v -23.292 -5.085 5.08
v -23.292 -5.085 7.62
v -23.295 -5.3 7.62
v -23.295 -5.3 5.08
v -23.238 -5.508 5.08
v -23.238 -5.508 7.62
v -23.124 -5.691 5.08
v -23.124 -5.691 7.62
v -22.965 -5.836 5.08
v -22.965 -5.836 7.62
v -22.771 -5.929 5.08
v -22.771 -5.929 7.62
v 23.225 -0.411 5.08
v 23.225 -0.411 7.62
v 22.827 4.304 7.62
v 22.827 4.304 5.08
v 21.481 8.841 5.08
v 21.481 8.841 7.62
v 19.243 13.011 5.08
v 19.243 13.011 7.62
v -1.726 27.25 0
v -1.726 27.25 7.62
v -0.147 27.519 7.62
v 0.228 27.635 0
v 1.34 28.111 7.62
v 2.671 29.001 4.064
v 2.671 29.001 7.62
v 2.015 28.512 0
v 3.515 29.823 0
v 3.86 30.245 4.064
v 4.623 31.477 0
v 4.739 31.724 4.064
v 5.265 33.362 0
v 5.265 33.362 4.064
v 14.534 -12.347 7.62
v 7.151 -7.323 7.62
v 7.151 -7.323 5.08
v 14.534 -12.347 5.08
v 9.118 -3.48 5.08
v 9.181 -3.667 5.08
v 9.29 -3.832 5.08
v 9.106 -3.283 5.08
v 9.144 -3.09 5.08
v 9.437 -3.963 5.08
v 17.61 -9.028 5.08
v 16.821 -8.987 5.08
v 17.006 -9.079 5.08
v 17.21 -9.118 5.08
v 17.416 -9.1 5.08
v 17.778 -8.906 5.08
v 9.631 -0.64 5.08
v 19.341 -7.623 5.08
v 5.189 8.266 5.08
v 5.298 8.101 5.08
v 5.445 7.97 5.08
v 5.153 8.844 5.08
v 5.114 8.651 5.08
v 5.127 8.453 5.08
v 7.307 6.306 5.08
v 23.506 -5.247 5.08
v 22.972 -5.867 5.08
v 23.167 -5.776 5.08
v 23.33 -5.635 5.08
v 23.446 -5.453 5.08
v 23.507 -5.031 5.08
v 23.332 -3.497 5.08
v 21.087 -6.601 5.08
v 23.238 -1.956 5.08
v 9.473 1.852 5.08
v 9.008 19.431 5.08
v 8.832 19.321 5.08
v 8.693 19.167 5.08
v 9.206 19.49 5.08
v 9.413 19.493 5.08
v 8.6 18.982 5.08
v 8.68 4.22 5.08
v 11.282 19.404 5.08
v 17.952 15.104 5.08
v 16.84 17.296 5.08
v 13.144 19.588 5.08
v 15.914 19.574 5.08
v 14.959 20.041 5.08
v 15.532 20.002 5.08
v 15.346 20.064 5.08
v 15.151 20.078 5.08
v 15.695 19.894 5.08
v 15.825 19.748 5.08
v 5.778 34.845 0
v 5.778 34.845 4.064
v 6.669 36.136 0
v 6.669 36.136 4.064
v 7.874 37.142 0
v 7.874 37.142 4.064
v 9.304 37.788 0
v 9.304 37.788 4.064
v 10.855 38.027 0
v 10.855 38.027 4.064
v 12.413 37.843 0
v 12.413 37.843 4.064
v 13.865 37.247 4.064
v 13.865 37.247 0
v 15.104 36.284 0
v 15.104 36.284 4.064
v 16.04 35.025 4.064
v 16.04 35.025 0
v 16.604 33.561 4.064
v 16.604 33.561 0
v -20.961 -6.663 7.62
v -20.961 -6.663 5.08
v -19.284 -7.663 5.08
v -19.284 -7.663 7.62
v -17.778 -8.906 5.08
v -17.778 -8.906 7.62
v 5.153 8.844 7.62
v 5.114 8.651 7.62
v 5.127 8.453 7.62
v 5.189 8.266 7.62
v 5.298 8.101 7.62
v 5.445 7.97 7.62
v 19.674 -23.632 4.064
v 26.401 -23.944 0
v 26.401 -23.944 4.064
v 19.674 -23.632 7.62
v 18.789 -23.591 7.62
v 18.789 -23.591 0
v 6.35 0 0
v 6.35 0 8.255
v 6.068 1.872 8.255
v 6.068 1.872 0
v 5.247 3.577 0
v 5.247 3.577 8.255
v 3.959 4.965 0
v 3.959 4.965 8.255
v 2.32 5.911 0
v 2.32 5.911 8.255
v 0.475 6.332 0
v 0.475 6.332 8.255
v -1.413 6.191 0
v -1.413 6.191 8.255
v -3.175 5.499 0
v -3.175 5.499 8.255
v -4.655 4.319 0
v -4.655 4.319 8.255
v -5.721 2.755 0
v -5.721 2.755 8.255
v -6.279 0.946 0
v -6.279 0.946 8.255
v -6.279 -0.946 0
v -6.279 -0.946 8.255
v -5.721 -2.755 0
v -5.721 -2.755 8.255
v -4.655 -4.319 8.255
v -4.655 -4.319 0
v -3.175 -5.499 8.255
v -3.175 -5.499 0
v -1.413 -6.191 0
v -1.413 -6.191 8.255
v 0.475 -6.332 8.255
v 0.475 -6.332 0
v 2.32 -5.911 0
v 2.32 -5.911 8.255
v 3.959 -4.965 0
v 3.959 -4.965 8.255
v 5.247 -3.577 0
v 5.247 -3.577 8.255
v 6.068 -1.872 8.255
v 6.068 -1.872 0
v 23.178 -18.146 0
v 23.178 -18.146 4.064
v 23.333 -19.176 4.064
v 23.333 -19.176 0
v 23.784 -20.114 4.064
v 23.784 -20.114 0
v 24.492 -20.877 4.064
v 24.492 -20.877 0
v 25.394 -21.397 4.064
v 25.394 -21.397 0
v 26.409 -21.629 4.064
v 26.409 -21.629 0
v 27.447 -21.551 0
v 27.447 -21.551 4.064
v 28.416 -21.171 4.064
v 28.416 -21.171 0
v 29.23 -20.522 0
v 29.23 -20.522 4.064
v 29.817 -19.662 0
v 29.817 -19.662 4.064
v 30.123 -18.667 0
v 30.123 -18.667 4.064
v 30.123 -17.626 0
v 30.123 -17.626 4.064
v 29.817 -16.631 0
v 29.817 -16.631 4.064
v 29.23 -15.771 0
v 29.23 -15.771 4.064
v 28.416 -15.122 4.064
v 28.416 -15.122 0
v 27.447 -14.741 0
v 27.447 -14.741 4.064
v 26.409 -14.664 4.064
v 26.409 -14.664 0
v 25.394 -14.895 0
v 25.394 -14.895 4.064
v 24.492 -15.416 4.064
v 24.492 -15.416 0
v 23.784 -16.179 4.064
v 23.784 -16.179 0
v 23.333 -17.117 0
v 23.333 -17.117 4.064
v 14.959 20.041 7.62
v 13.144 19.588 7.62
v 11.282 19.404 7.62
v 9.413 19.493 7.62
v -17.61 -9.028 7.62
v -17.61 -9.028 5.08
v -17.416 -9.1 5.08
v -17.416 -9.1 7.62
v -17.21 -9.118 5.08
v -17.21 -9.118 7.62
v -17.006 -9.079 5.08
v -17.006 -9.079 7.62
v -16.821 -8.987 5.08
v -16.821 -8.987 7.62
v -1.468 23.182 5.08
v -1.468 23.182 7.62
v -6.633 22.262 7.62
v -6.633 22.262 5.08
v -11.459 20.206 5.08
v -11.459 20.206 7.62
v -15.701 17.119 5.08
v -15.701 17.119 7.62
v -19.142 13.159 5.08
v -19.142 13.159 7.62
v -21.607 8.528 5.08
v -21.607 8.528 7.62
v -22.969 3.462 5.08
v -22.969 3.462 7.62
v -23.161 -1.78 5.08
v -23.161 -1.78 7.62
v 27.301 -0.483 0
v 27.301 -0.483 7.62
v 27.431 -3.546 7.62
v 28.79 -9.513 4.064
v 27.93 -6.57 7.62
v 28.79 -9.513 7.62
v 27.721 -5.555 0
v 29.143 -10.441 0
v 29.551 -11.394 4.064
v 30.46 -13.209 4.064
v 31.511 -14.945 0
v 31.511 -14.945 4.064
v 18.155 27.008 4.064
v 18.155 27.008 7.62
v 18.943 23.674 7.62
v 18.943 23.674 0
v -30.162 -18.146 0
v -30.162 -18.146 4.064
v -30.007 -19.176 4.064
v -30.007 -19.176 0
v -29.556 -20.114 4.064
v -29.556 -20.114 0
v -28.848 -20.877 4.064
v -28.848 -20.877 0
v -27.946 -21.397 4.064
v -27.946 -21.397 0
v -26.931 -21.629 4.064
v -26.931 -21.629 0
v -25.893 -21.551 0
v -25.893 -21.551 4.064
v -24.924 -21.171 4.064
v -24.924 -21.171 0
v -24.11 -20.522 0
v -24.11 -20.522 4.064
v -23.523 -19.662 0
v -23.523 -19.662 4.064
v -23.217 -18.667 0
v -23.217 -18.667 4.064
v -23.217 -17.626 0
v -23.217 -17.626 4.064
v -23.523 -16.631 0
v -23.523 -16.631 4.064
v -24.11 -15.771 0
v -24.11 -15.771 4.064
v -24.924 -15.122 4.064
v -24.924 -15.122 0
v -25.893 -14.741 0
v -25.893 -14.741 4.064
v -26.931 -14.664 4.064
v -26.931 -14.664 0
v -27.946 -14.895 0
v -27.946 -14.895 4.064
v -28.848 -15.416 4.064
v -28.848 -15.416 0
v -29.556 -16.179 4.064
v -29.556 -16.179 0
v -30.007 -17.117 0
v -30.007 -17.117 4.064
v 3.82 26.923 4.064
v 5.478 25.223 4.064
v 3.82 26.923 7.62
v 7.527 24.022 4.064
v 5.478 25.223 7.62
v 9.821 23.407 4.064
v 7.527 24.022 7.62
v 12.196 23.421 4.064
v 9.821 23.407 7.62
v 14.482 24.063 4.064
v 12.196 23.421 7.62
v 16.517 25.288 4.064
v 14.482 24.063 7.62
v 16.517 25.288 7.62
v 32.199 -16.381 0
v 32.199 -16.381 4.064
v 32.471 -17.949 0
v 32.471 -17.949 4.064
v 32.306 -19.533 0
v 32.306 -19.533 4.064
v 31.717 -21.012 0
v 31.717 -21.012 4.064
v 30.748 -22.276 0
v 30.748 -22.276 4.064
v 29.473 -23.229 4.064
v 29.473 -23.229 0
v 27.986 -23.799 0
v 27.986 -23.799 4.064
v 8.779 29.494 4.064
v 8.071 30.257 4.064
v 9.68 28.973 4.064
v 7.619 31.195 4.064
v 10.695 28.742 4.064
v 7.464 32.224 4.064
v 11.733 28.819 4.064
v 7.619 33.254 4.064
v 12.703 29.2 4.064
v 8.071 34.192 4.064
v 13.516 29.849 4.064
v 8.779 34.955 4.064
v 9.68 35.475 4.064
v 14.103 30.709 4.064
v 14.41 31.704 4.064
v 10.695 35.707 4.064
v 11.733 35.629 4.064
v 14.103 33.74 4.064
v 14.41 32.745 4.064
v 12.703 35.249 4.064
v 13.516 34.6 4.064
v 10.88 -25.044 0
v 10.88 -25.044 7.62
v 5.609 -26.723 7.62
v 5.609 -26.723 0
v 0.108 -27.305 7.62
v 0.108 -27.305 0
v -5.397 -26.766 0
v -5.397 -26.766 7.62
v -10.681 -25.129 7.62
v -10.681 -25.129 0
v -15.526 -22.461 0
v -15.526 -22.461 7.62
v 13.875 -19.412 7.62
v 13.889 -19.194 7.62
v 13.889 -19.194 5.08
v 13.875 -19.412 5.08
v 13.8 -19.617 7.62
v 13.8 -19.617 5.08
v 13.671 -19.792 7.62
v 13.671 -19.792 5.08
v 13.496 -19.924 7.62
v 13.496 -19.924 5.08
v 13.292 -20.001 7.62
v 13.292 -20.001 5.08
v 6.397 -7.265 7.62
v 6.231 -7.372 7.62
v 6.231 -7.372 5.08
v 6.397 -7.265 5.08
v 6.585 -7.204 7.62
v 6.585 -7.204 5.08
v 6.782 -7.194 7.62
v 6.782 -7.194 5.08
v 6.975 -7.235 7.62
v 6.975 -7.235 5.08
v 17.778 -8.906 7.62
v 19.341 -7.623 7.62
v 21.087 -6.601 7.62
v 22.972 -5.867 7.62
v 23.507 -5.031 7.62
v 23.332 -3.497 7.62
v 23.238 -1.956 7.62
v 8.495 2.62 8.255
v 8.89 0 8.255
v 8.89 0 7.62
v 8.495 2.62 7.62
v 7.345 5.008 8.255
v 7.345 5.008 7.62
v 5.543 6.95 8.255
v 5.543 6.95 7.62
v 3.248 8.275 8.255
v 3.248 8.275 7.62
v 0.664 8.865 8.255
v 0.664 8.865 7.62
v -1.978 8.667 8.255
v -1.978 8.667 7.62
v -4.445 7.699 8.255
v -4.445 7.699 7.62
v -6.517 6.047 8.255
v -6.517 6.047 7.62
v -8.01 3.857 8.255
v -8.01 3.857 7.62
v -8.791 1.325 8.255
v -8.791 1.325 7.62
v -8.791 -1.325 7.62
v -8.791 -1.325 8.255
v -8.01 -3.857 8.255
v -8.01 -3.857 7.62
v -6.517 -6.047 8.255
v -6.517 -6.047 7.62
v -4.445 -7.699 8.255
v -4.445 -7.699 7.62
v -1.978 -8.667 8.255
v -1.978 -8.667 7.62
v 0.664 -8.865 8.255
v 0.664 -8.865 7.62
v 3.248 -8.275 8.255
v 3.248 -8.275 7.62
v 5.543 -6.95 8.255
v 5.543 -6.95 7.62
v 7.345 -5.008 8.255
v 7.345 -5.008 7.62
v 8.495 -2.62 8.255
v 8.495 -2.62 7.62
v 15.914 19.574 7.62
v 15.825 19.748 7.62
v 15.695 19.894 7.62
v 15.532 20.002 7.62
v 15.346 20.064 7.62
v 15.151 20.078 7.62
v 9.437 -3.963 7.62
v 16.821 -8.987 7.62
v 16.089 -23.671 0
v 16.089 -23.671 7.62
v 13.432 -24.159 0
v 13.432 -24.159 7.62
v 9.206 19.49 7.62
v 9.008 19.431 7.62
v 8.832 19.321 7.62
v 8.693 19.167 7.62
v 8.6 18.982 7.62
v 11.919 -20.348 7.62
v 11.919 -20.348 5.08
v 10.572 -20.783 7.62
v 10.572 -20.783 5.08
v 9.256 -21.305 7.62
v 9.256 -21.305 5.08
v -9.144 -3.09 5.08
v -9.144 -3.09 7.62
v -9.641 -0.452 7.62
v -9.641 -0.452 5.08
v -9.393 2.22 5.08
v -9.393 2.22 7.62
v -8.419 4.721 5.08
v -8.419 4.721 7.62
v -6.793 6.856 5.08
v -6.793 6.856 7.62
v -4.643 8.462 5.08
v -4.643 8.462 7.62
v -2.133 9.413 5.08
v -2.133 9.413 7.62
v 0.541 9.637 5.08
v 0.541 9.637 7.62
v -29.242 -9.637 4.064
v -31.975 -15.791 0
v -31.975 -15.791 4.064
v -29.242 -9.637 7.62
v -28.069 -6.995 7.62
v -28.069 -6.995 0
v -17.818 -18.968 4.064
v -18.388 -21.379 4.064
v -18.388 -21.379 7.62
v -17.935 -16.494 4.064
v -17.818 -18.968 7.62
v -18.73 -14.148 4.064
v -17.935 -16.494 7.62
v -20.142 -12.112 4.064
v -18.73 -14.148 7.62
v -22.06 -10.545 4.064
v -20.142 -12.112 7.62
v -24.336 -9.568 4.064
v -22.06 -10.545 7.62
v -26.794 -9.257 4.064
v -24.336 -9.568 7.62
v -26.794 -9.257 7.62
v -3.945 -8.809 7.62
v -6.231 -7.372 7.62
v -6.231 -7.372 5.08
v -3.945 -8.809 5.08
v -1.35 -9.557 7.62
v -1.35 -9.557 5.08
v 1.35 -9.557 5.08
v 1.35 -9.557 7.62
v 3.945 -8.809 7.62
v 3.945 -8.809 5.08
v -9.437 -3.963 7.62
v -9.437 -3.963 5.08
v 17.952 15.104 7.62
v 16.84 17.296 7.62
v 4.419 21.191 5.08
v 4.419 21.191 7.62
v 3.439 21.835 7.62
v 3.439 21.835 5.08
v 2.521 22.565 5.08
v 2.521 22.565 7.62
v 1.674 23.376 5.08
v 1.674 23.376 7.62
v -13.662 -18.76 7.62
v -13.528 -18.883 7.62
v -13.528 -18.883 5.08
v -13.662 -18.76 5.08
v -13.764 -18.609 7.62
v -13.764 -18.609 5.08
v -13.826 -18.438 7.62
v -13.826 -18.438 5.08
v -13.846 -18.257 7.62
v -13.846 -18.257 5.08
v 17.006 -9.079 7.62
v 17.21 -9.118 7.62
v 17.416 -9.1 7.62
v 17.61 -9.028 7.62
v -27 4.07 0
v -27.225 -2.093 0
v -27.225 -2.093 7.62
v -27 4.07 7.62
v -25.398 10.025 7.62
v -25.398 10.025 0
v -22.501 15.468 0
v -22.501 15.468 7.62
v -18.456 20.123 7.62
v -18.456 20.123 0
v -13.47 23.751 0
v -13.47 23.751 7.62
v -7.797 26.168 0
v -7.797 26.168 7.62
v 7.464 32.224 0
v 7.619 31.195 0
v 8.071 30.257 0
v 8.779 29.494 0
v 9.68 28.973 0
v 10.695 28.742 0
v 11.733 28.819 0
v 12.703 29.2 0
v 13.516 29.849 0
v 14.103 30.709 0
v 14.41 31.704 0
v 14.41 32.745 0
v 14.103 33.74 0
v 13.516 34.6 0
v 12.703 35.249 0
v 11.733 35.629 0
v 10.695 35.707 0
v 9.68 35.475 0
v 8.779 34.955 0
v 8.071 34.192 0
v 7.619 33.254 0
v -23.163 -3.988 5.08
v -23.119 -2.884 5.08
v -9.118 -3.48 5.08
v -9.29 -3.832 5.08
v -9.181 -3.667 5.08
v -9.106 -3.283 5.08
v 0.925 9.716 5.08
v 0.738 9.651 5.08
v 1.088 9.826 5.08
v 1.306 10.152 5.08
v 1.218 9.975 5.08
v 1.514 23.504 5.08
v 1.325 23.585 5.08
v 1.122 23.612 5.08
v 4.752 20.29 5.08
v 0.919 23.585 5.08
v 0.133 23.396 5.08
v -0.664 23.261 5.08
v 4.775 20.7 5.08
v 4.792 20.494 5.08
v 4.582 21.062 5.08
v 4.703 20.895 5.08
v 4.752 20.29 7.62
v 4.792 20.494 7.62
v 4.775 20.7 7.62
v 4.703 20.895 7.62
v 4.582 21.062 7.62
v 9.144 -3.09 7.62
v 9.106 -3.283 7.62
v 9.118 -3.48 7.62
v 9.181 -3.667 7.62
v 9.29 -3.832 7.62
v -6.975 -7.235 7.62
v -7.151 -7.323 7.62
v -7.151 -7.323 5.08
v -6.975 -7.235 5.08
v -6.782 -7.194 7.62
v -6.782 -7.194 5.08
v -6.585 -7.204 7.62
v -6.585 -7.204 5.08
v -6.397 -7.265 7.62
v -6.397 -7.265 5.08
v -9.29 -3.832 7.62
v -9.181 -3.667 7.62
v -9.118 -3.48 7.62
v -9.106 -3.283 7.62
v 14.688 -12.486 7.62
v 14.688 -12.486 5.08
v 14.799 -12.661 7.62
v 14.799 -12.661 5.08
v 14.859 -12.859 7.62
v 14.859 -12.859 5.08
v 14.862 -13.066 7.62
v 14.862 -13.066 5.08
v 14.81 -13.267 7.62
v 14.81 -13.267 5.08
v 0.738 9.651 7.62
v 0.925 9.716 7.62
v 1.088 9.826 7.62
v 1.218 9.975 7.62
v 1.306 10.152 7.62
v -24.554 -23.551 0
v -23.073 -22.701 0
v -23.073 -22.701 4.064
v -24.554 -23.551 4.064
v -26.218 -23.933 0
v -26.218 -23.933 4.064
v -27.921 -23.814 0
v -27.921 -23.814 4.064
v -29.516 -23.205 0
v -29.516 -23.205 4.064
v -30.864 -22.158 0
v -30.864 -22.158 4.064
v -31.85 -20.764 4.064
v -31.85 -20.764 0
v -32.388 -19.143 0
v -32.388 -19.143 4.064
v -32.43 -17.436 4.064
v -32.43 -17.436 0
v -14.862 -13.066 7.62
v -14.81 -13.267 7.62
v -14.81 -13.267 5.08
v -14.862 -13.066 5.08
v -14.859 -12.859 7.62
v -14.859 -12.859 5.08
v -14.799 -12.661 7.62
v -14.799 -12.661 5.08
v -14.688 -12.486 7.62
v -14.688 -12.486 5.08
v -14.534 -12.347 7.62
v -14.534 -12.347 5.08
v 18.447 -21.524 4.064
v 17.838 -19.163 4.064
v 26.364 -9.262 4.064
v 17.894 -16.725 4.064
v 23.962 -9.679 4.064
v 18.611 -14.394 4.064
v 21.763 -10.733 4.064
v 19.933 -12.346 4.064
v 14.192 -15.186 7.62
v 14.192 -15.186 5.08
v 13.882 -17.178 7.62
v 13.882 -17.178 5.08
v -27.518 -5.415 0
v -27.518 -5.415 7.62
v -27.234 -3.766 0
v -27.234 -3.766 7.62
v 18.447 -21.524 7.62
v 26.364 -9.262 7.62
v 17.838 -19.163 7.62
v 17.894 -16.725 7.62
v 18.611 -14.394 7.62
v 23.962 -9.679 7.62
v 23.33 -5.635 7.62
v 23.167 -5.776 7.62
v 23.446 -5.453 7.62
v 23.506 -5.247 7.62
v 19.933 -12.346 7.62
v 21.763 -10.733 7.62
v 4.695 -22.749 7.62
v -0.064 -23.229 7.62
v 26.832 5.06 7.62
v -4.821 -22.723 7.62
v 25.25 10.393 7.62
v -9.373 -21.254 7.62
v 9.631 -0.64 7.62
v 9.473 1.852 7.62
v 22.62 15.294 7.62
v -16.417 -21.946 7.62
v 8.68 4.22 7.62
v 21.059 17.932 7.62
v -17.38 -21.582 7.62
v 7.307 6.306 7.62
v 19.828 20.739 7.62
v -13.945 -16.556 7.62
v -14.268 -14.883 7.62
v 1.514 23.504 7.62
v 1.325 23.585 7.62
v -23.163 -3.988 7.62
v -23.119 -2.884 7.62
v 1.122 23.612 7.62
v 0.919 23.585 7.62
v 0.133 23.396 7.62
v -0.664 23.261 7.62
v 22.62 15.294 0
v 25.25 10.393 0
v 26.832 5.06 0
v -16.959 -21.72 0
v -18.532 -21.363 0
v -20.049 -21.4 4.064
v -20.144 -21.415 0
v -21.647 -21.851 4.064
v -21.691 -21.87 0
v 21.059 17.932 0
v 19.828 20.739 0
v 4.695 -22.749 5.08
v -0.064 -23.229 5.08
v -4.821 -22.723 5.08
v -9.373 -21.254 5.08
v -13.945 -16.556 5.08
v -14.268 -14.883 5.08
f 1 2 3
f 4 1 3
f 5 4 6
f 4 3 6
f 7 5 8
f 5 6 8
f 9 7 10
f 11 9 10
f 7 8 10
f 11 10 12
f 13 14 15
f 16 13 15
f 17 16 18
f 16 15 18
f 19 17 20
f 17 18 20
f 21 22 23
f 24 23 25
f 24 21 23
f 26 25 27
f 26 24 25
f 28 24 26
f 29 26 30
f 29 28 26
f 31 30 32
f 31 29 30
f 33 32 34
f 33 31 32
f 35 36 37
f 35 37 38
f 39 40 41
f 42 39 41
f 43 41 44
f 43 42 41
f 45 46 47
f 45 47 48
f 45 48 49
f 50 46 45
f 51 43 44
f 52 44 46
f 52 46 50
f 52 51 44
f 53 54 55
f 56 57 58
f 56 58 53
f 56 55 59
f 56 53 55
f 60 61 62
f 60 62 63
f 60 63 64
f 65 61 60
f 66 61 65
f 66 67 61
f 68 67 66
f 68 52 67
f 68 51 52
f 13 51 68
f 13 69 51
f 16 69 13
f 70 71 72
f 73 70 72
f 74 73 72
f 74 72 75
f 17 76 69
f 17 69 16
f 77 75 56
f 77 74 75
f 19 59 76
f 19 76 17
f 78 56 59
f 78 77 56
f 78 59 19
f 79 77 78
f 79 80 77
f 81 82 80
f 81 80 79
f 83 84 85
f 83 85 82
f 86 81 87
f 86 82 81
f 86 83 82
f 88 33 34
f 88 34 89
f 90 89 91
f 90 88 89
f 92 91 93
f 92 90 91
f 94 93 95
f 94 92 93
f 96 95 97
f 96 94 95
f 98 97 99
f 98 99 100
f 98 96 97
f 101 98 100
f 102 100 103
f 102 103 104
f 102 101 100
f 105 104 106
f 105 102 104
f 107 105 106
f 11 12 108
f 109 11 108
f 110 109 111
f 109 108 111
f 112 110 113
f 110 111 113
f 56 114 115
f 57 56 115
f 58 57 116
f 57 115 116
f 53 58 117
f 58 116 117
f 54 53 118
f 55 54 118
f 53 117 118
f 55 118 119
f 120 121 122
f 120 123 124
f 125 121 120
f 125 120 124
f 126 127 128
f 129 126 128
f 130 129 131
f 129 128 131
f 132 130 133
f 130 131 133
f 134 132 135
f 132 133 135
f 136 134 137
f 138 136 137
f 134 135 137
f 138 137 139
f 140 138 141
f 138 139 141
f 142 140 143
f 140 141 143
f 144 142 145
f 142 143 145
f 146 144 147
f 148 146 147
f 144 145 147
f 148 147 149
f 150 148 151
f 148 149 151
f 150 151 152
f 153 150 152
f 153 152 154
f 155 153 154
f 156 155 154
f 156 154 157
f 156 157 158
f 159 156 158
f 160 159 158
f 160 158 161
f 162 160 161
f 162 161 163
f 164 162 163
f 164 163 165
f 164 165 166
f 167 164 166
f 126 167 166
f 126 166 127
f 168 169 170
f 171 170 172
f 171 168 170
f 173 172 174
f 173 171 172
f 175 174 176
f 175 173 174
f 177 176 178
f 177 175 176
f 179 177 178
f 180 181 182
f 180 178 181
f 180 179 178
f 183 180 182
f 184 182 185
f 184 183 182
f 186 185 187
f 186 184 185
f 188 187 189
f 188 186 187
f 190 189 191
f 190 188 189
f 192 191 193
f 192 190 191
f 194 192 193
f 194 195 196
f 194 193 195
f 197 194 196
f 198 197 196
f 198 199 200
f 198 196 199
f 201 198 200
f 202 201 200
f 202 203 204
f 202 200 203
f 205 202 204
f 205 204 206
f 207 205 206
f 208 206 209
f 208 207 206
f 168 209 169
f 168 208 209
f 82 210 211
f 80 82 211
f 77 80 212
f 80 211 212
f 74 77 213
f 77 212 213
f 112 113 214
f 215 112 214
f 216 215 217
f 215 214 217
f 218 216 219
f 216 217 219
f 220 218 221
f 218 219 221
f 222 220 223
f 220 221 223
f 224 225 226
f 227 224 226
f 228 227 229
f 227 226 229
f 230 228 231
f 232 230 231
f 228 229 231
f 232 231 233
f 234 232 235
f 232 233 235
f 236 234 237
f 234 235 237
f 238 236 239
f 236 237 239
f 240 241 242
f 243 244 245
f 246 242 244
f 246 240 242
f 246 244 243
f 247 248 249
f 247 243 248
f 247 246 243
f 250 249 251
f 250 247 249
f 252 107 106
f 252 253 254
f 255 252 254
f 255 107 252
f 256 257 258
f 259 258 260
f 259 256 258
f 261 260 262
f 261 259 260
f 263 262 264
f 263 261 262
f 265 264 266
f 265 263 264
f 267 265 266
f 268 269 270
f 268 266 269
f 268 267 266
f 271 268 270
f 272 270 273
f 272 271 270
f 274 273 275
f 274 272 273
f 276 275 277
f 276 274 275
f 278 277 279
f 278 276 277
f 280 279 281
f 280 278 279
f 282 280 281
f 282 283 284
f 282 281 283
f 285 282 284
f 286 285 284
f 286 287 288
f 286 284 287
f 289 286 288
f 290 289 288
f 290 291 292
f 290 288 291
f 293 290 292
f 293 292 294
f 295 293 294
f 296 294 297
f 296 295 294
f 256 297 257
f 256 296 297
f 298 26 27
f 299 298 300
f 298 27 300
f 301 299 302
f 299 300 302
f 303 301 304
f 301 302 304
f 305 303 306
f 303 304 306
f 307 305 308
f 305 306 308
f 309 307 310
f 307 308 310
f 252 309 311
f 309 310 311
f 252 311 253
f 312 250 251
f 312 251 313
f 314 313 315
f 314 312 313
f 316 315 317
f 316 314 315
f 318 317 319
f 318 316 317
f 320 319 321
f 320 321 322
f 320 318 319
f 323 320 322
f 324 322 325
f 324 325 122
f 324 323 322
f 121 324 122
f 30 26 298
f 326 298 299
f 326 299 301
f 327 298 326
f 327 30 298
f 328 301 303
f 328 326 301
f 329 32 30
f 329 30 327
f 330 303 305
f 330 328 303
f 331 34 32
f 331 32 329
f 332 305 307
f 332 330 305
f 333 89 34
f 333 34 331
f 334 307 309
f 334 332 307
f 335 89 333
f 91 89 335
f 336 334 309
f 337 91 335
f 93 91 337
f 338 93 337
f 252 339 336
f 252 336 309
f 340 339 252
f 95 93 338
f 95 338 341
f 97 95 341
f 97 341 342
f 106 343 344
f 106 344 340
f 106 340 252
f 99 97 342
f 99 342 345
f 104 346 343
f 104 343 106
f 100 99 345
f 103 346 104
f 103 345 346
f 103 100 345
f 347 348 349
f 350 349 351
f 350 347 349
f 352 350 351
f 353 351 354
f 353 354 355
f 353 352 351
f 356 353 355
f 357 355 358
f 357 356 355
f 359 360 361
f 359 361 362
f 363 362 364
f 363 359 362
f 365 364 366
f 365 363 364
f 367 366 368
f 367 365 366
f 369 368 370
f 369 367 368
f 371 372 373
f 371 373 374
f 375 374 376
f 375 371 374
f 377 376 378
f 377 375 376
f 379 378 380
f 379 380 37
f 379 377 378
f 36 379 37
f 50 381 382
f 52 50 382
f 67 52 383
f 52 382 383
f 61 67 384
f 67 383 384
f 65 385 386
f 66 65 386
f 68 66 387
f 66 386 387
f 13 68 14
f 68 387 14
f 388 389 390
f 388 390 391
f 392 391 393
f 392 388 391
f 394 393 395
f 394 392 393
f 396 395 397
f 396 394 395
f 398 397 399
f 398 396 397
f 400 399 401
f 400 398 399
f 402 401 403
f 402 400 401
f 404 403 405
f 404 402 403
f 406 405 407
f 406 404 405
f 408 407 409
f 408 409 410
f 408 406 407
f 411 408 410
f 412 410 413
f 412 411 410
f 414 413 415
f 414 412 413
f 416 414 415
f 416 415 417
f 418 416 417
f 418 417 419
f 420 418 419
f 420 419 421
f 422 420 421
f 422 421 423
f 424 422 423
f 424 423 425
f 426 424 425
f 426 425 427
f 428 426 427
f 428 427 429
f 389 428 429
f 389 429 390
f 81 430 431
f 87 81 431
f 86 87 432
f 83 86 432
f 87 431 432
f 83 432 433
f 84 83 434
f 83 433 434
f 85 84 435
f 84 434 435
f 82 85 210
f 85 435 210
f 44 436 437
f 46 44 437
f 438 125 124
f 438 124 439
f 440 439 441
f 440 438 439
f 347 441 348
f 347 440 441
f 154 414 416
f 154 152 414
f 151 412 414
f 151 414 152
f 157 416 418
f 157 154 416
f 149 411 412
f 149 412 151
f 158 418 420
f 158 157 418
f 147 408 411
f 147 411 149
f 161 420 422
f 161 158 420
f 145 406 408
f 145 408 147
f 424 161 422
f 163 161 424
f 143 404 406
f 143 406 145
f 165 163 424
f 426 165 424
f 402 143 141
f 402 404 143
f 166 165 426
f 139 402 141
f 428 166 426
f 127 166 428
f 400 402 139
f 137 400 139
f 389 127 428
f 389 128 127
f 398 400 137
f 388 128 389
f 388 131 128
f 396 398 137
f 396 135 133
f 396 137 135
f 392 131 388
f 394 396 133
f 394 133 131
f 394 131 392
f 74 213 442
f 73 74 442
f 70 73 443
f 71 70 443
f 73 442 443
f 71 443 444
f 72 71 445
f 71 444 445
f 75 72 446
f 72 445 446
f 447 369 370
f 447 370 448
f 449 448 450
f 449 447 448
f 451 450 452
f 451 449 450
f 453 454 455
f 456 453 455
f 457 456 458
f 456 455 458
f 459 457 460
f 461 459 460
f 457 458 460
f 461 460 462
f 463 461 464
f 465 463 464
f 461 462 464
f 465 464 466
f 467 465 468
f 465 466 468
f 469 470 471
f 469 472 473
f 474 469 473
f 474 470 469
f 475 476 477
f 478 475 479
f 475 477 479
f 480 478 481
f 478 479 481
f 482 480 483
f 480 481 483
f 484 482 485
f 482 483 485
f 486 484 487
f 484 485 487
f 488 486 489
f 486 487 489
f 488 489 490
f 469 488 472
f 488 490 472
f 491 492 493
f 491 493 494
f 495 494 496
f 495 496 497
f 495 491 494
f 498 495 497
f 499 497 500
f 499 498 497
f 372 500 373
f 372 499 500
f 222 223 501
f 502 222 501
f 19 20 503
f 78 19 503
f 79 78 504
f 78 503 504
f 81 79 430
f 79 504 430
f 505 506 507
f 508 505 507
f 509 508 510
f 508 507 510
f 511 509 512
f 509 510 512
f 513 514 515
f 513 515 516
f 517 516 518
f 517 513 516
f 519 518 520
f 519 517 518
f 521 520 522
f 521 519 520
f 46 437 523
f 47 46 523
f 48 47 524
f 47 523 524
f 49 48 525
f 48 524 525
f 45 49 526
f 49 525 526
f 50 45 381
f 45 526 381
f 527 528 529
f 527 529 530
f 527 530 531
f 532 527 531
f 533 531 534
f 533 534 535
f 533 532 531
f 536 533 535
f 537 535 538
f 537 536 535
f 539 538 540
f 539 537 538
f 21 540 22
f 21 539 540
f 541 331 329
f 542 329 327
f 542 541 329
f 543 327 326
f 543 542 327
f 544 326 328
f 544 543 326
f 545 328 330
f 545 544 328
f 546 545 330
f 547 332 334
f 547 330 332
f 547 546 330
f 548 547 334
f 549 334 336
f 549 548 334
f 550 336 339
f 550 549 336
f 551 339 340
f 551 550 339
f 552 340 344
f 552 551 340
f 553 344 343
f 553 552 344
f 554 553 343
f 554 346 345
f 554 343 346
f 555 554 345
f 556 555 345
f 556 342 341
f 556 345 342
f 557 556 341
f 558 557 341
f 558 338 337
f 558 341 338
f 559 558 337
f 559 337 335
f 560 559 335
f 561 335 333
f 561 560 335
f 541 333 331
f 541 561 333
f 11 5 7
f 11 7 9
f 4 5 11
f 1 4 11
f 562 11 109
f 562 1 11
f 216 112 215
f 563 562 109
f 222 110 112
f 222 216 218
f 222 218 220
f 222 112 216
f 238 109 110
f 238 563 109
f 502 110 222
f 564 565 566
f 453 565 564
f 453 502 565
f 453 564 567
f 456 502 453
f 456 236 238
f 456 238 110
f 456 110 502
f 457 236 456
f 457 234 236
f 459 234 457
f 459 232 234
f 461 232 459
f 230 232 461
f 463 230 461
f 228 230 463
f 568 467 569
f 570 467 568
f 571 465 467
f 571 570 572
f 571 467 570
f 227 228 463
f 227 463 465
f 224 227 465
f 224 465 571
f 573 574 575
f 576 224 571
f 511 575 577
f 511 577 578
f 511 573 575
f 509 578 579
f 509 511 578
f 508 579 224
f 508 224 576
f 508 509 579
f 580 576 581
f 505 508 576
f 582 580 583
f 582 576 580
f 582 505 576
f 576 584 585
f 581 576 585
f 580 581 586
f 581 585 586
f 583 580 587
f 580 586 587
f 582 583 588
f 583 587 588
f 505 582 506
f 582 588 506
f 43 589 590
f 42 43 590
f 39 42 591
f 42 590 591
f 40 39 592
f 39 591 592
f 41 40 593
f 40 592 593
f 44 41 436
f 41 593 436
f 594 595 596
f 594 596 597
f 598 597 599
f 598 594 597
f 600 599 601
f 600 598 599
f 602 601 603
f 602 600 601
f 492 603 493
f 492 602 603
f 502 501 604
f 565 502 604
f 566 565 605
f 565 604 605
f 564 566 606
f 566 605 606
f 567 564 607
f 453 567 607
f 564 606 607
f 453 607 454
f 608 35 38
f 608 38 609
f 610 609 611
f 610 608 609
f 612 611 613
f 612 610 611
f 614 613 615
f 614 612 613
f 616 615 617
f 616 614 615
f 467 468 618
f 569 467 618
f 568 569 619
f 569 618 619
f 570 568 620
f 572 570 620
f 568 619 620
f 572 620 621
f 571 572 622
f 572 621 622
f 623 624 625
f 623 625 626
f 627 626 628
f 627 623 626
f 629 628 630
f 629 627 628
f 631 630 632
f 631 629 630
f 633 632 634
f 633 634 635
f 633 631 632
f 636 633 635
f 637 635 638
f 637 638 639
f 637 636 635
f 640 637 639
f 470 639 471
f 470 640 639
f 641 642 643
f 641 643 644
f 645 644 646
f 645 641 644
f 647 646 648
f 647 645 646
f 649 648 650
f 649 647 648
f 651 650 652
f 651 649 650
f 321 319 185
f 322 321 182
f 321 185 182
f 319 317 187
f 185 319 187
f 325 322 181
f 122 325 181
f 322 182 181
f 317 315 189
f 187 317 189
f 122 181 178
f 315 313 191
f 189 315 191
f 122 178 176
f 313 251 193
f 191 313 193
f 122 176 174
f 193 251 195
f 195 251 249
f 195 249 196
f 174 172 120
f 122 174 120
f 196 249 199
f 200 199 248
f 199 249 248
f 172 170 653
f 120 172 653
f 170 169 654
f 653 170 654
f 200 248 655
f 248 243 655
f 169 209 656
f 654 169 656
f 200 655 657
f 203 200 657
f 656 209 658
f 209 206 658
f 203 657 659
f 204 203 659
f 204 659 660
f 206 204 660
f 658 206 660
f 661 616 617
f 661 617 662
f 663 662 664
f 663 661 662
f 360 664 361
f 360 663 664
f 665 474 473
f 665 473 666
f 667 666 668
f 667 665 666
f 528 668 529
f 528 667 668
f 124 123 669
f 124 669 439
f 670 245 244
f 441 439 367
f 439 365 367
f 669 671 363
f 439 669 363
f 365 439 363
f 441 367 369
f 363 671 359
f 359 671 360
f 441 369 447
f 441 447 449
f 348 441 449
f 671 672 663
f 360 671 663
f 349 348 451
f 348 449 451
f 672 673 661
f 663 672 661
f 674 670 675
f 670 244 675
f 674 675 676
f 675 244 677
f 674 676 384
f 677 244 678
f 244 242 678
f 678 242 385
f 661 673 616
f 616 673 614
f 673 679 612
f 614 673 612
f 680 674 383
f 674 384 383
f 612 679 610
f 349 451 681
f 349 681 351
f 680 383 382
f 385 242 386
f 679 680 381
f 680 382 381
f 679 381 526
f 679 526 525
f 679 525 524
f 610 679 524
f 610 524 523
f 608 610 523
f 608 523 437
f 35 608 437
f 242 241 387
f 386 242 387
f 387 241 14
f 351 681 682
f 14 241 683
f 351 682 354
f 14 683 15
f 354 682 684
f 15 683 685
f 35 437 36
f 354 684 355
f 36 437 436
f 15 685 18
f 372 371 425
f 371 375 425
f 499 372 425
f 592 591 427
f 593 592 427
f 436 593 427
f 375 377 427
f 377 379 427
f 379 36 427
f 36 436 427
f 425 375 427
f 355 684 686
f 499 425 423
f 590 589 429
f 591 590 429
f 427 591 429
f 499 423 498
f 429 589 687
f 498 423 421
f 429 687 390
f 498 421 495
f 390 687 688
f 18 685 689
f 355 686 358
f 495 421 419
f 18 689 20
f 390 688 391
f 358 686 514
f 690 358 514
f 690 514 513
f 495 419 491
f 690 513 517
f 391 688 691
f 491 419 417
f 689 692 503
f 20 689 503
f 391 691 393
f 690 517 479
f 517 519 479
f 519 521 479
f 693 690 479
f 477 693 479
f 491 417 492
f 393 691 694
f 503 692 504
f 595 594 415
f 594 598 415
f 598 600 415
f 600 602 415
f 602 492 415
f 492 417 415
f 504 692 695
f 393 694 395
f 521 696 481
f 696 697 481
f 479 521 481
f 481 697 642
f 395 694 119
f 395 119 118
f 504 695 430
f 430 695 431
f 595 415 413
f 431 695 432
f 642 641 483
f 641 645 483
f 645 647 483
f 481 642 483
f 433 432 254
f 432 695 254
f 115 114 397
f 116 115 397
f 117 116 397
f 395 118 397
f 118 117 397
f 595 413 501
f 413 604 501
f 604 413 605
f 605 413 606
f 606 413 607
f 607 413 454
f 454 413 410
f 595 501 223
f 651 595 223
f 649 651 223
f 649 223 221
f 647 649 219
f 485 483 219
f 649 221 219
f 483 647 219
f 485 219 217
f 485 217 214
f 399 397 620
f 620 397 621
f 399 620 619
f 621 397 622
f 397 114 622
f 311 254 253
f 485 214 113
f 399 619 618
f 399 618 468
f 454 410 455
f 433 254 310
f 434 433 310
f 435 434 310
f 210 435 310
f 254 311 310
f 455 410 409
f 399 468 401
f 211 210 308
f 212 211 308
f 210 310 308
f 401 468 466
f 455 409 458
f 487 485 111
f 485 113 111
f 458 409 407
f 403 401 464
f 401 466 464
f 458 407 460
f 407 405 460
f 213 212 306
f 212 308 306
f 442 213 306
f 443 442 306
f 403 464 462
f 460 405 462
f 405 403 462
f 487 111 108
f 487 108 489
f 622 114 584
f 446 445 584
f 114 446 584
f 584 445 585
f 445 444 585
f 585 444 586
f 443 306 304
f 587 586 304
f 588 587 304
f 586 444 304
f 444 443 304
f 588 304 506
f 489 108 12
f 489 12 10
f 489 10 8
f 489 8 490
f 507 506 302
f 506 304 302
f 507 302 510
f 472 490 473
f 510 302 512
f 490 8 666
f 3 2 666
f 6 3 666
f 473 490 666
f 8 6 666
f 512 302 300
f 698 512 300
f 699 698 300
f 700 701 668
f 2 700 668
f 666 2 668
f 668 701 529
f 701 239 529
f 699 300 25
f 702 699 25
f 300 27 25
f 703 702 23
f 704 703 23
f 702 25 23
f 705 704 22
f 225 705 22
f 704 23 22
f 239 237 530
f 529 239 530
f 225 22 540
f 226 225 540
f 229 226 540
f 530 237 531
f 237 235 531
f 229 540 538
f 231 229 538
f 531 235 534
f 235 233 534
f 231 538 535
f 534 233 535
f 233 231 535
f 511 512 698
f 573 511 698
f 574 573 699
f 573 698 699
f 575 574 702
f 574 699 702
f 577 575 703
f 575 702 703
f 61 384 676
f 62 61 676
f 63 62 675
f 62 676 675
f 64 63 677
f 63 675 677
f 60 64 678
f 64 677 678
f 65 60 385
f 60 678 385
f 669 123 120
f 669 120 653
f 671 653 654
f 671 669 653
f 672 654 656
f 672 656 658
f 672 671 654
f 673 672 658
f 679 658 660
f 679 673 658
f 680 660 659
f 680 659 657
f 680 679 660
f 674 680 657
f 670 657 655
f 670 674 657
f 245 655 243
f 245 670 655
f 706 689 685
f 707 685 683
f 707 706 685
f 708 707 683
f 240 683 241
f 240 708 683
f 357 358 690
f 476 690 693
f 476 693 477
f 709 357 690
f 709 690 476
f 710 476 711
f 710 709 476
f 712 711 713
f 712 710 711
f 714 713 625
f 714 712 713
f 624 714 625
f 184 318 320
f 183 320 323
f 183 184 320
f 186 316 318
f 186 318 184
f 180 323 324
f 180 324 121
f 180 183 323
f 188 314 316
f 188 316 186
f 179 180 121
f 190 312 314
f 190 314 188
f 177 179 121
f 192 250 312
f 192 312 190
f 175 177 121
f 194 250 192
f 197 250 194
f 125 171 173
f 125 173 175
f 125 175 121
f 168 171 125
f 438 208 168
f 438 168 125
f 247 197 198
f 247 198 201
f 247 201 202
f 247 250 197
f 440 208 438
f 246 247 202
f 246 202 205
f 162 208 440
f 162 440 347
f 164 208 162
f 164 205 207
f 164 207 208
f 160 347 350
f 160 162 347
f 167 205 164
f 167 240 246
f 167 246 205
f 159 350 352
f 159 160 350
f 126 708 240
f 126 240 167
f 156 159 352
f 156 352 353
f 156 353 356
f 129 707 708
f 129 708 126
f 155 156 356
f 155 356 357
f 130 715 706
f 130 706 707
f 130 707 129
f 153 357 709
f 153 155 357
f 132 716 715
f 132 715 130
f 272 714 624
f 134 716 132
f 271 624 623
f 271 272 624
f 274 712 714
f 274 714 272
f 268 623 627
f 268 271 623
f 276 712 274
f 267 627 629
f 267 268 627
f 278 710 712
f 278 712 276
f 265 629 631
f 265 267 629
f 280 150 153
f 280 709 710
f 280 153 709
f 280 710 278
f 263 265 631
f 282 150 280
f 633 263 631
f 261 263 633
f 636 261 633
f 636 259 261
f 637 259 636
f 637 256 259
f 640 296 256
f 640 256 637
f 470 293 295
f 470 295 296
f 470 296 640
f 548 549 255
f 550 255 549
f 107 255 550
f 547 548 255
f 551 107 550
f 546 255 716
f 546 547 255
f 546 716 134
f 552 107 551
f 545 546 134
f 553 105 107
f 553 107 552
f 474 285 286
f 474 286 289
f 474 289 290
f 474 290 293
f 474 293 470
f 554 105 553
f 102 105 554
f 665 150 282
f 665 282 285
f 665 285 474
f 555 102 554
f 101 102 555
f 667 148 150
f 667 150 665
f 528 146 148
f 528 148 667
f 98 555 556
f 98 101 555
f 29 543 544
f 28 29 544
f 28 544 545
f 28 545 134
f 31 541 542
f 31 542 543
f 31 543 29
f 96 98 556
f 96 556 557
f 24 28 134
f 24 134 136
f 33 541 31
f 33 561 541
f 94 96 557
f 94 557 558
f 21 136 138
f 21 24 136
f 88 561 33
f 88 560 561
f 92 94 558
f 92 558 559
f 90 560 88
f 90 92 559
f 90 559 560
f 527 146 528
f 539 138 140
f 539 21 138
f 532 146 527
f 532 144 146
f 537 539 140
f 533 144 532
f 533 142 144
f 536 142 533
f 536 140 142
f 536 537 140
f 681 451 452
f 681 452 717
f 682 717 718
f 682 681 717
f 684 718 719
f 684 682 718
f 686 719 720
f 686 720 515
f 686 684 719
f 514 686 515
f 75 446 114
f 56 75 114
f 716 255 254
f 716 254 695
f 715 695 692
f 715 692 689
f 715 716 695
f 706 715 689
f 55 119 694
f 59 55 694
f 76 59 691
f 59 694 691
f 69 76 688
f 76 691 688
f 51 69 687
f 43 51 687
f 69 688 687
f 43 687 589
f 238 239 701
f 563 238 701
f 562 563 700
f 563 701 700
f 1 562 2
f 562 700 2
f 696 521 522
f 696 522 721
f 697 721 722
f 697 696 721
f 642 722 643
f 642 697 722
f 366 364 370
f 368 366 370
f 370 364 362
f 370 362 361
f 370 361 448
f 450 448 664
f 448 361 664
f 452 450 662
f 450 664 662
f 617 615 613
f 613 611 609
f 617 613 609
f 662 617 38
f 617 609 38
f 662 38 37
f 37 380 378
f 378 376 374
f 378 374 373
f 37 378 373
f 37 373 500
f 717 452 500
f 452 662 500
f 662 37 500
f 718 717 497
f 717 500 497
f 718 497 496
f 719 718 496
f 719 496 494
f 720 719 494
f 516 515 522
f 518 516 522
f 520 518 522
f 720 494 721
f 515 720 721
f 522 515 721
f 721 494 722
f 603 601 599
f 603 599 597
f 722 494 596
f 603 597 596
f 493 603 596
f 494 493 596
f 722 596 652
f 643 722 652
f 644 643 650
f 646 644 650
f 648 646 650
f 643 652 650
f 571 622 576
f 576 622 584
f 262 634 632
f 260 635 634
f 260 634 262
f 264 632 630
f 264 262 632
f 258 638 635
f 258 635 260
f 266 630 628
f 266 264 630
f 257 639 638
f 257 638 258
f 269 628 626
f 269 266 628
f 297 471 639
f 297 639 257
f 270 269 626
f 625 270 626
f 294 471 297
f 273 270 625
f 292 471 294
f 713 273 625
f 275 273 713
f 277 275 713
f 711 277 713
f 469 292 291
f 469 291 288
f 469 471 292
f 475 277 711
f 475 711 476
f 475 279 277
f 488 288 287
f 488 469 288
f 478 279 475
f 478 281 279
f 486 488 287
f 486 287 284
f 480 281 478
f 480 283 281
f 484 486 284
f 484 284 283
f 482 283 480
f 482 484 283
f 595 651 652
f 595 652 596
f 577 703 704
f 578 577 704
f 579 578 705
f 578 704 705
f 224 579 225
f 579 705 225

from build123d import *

# Parameters (mm, degrees)
SKETCH1_R           = 3.4925
BASE_DEPTH          = 7.62
BOSS_EXTRUDE1_REACH = 52.684
SKETCH2_R           = 8.89
RIBS_DEPTH          = 2.54
EAR_1_DEPTH         = 3.556
EAR_2_DEPTH         = 3.556
EAR_3_DEPTH         = 3.556
SKETCH7_R           = 6.35
CUT_EXTRUDE5_DEPTH  = 51.683799656


with BuildPart() as part:
    # Sketch1 → Base (new body)
    with BuildSketch(Plane.XY):
        with BuildLine():
            Line((16.604256141, 33.560634381), (18.943472312, 23.673588932))
            ThreePointArc((18.943472312, 23.673588932), (20.401103388, 19.31706117), (22.619598737, 15.294338102))
            ThreePointArc((22.619598737, 15.294338102), (26.177171365, 7.766513011), (27.300719551, -0.483463539))
            ThreePointArc((27.300719551, -0.483463539), (28.309281475, -8.033336288), (31.510952034, -14.944709618))
            ThreePointArc((31.510952034, -14.944709618), (31.716980405, -21.01221602), (26.400801283, -23.943993837))
            Line((26.400801283, -23.943993837), (18.789002246, -23.590560073))
            ThreePointArc((18.789002246, -23.590560073), (14.751162948, -23.864172006), (10.879801534, -25.043820467))
            ThreePointArc((10.879801534, -25.043820467), (-2.658121922, -27.175308882), (-15.526424221, -22.460925535))
            ThreePointArc((-15.526424221, -22.460925535), (-19.339203493, -21.337609774), (-23.072841998, -22.701086061))
            ThreePointArc((-23.072841998, -22.701086061), (-30.228876792, -22.731059551), (-31.974558392, -15.791151184))
            Line((-31.974558392, -15.791151184), (-28.068905544, -6.994505511))
            ThreePointArc((-28.068905544, -6.994505511), (-27.342210837, -4.596155707), (-27.224673499, -2.092887453))
            ThreePointArc((-27.224673499, -2.092887453), (-20.610396453, 17.910180989), (-1.725707135, 27.250412105))
            ThreePointArc((-1.725707135, 27.250412105), (2.807988712, 29.118342831), (5.264931729, 33.361807717))
            ThreePointArc((5.264931729, 33.361807717), (10.854529977, 38.027365143), (16.604256141, 33.560634381))
        make_face()
        with Locations(Location((10.956281429, 32.224357143, 0), (0, 0, 180))):
            Circle(SKETCH1_R, mode=Mode.SUBTRACT)
        with Locations(Location((-26.67, -18.146340237, 0), (0, 0, 180))):
            Circle(SKETCH1_R, mode=Mode.SUBTRACT)
        with Locations(Location((26.67, -18.146340237, 0), (0, 0, 180))):
            Circle(SKETCH1_R, mode=Mode.SUBTRACT)
    extrude(amount=BASE_DEPTH)

    # Sketch2 → Boss-Extrude1 (add, up to next)
    with BuildSketch(Plane.XY.offset(8.255), mode=Mode.PRIVATE) as boss_extrude1_sk1:
        Circle(SKETCH2_R)
    boss_extrude1_tool1 = extrude(boss_extrude1_sk1.sketch, amount=-BOSS_EXTRUDE1_REACH, mode=Mode.PRIVATE) - part.part
    add(boss_extrude1_tool1.solids().sort_by_distance((0, 0, 8.255))[0])

    # Sketch3 → Ribs (cut)
    with BuildSketch(Plane.XY.offset(7.62)):
        with BuildLine():
            Line((-16.82050136, -8.986962316), (-9.437411961, -3.963488288))
            ThreePointArc((-9.437411961, -3.963488288), (-9.143653766, -3.575903337), (-9.144158406, -3.089574522))
            ThreePointArc((-9.144158406, -3.089574522), (-7.680637059, 5.845418599), (0.541368836, 9.636805696))
            ThreePointArc((0.541368836, 9.636805696), (1.010249912, 9.765904218), (1.305549154, 10.152316246))
            Line((1.305549154, 10.152316246), (4.752490825, 20.290380019))
            ThreePointArc((4.752490825, 20.290380019), (4.745775858, 20.799887499), (4.419461373, 21.191246438))
            ThreePointArc((4.419461373, 21.191246438), (2.971516318, 22.189265061), (1.673721066, 23.375988923))
            ThreePointArc((1.673721066, 23.375988923), (1.324970657, 23.584742075), (0.91851691, 23.584511061))
            ThreePointArc((0.91851691, 23.584511061), (-0.264361157, 23.321590055), (-1.468093727, 23.182464697))
            ThreePointArc((-1.468093727, 23.182464697), (-17.533671501, 15.236545944), (-23.160568555, -1.780458597))
            ThreePointArc((-23.160568555, -1.780458597), (-23.129900004, -3.436522013), (-23.291793081, -5.084938595))
            ThreePointArc((-23.291793081, -5.084938595), (-23.187534661, -5.603558506), (-22.770748598, -5.929328057))
            ThreePointArc((-22.770748598, -5.929328057), (-20.103253711, -7.131014955), (-17.77753644, -8.906013418))
            ThreePointArc((-17.77753644, -8.906013418), (-17.313377981, -9.116251065), (-16.82050136, -8.986962316))
        make_face()
        with BuildLine():
            Line((8.600175256, 18.982167319), (5.153233585, 8.844103546))
            ThreePointArc((5.153233585, 8.844103546), (5.151801602, 8.357776542), (5.444820248, 7.969632141))
            ThreePointArc((5.444820248, 7.969632141), (9.153474124, 3.061864703), (9.144158328, -3.089574805))
            ThreePointArc((9.144158328, -3.089574805), (9.143653829, -3.575903471), (9.437411961, -3.963488288))
            Line((9.437411961, -3.963488288), (16.820501249, -8.986962233))
            ThreePointArc((16.820501249, -8.986962233), (17.313378574, -9.116251013), (17.77753741, -8.906012507))
            ThreePointArc((17.77753741, -8.906012507), (20.193990454, -7.077426658), (22.972046166, -5.866898682))
            ThreePointArc((22.972046166, -5.866898682), (23.394092887, -5.548081357), (23.506917421, -5.031323638))
            ThreePointArc((23.506917421, -5.031323638), (23.275264524, -2.726844111), (23.225262219, -0.411290455))
            ThreePointArc((23.225262219, -0.411290455), (22.269437317, 6.607126953), (19.242940228, 13.011195948))
            ThreePointArc((19.242940228, 13.011195948), (17.372981423, 16.188369668), (15.914244764, 19.574114216))
            ThreePointArc((15.914244764, 19.574114216), (15.531519696, 20.001577905), (14.959105055, 20.040886782))
            ThreePointArc((14.959105055, 20.040886782), (12.216303466, 19.462229871), (9.413298568, 19.493341792))
            ThreePointArc((9.413298568, 19.493341792), (8.916062473, 19.381990041), (8.600175256, 18.982167319))
        make_face()
        with BuildLine():
            Line((7.151258875, -7.323488274), (14.534348232, -12.346962288))
            ThreePointArc((14.534348232, -12.346962288), (14.835546333, -12.757963676), (14.810381819, -13.26689313))
            ThreePointArc((14.810381819, -13.26689313), (13.998126604, -16.175763644), (13.888681178, -19.193926648))
            ThreePointArc((13.888681178, -19.193926648), (13.741882081, -19.709272424), (13.292122475, -20.00055849))
            ThreePointArc((13.292122475, -20.00055849), (11.242161258, -20.554754651), (9.255658504, -21.305275269))
            ThreePointArc((9.255658504, -21.305275269), (-2.455638263, -23.098740428), (-13.528106469, -18.883122199))
            ThreePointArc((-13.528106469, -18.883122199), (-13.763616748, -18.608952972), (-13.846300089, -18.257104539))
            ThreePointArc((-13.846300089, -18.257104539), (-14.078649652, -15.713760427), (-14.81038135, -13.266894204))
            ThreePointArc((-14.81038135, -13.266894204), (-14.83554649, -12.757964252), (-14.534348249, -12.346962301))
            Line((-14.534348249, -12.346962301), (-7.15125892, -7.323488332))
            ThreePointArc((-7.15125892, -7.323488332), (-6.682895541, -7.19252367), (-6.230707232, -7.37152571))
            ThreePointArc((-6.230707232, -7.37152571), (1.2e-08, -9.651999996), (6.230707236, -7.371525677))
            ThreePointArc((6.230707236, -7.371525677), (6.682895517, -7.192523649), (7.151258875, -7.323488274))
        make_face()
    extrude(amount=-RIBS_DEPTH, mode=Mode.SUBTRACT)

    # Sketch4 → Ear 1 (cut)
    with BuildSketch(Plane.XY.offset(7.62)):
        with BuildLine():
            Line((18.154678619, 27.007540298), (18.154678619, 40.040057117))
            Line((18.154678619, 40.040057117), (2.671053035, 40.040057117))
            Line((2.671053035, 40.040057117), (2.671053035, 29.001456211))
            ThreePointArc((2.671053035, 29.001456211), (9.820840691, 23.407165193), (18.154678619, 27.007540298))
        make_face()
    extrude(amount=-EAR_1_DEPTH, mode=Mode.SUBTRACT)

    # Sketch5 → Ear 2 (cut)
    with BuildSketch(Plane.XY.offset(7.62)):
        with BuildLine():
            Line((37.540663752, -9.512717098), (37.540663752, -27.850835624))
            Line((37.540663752, -27.850835624), (19.674041943, -27.850835624))
            Line((19.674041943, -27.850835624), (19.674041943, -23.631654346))
            ThreePointArc((19.674041943, -23.631654346), (19.201342522, -13.324384672), (28.789587575, -9.512717098))
            Line((28.789587575, -9.512717098), (37.540663752, -9.512717098))
        make_face()
    extrude(amount=-EAR_2_DEPTH, mode=Mode.SUBTRACT)

    # Sketch6 → Ear 3 (cut)
    with BuildSketch(Plane.XY.offset(7.62)):
        with BuildLine():
            Line((-29.241937643, -9.636508467), (-37.354784568, -9.636508467))
            Line((-37.354784568, -9.636508467), (-37.354784568, -30.196246958))
            Line((-37.354784568, -30.196246958), (-20.617156227, -30.196246958))
            Line((-20.617156227, -30.196246958), (-20.617156227, -25.655566183))
            ThreePointArc((-20.617156227, -25.655566183), (-20.457991369, -24.783962969), (-20.001042351, -24.024869295))
            ThreePointArc((-20.001042351, -24.024869295), (-19.189851268, -13.342230024), (-29.241937643, -9.636508467))
        make_face()
    extrude(amount=-EAR_3_DEPTH, mode=Mode.SUBTRACT)

    # Sketch7 → Cut-Extrude5 (cut, through all)
    with BuildSketch(Plane.XY.offset(8.255)):
        Circle(SKETCH7_R)
    extrude(amount=-CUT_EXTRUDE5_DEPTH, mode=Mode.SUBTRACT)


solid = part.part
